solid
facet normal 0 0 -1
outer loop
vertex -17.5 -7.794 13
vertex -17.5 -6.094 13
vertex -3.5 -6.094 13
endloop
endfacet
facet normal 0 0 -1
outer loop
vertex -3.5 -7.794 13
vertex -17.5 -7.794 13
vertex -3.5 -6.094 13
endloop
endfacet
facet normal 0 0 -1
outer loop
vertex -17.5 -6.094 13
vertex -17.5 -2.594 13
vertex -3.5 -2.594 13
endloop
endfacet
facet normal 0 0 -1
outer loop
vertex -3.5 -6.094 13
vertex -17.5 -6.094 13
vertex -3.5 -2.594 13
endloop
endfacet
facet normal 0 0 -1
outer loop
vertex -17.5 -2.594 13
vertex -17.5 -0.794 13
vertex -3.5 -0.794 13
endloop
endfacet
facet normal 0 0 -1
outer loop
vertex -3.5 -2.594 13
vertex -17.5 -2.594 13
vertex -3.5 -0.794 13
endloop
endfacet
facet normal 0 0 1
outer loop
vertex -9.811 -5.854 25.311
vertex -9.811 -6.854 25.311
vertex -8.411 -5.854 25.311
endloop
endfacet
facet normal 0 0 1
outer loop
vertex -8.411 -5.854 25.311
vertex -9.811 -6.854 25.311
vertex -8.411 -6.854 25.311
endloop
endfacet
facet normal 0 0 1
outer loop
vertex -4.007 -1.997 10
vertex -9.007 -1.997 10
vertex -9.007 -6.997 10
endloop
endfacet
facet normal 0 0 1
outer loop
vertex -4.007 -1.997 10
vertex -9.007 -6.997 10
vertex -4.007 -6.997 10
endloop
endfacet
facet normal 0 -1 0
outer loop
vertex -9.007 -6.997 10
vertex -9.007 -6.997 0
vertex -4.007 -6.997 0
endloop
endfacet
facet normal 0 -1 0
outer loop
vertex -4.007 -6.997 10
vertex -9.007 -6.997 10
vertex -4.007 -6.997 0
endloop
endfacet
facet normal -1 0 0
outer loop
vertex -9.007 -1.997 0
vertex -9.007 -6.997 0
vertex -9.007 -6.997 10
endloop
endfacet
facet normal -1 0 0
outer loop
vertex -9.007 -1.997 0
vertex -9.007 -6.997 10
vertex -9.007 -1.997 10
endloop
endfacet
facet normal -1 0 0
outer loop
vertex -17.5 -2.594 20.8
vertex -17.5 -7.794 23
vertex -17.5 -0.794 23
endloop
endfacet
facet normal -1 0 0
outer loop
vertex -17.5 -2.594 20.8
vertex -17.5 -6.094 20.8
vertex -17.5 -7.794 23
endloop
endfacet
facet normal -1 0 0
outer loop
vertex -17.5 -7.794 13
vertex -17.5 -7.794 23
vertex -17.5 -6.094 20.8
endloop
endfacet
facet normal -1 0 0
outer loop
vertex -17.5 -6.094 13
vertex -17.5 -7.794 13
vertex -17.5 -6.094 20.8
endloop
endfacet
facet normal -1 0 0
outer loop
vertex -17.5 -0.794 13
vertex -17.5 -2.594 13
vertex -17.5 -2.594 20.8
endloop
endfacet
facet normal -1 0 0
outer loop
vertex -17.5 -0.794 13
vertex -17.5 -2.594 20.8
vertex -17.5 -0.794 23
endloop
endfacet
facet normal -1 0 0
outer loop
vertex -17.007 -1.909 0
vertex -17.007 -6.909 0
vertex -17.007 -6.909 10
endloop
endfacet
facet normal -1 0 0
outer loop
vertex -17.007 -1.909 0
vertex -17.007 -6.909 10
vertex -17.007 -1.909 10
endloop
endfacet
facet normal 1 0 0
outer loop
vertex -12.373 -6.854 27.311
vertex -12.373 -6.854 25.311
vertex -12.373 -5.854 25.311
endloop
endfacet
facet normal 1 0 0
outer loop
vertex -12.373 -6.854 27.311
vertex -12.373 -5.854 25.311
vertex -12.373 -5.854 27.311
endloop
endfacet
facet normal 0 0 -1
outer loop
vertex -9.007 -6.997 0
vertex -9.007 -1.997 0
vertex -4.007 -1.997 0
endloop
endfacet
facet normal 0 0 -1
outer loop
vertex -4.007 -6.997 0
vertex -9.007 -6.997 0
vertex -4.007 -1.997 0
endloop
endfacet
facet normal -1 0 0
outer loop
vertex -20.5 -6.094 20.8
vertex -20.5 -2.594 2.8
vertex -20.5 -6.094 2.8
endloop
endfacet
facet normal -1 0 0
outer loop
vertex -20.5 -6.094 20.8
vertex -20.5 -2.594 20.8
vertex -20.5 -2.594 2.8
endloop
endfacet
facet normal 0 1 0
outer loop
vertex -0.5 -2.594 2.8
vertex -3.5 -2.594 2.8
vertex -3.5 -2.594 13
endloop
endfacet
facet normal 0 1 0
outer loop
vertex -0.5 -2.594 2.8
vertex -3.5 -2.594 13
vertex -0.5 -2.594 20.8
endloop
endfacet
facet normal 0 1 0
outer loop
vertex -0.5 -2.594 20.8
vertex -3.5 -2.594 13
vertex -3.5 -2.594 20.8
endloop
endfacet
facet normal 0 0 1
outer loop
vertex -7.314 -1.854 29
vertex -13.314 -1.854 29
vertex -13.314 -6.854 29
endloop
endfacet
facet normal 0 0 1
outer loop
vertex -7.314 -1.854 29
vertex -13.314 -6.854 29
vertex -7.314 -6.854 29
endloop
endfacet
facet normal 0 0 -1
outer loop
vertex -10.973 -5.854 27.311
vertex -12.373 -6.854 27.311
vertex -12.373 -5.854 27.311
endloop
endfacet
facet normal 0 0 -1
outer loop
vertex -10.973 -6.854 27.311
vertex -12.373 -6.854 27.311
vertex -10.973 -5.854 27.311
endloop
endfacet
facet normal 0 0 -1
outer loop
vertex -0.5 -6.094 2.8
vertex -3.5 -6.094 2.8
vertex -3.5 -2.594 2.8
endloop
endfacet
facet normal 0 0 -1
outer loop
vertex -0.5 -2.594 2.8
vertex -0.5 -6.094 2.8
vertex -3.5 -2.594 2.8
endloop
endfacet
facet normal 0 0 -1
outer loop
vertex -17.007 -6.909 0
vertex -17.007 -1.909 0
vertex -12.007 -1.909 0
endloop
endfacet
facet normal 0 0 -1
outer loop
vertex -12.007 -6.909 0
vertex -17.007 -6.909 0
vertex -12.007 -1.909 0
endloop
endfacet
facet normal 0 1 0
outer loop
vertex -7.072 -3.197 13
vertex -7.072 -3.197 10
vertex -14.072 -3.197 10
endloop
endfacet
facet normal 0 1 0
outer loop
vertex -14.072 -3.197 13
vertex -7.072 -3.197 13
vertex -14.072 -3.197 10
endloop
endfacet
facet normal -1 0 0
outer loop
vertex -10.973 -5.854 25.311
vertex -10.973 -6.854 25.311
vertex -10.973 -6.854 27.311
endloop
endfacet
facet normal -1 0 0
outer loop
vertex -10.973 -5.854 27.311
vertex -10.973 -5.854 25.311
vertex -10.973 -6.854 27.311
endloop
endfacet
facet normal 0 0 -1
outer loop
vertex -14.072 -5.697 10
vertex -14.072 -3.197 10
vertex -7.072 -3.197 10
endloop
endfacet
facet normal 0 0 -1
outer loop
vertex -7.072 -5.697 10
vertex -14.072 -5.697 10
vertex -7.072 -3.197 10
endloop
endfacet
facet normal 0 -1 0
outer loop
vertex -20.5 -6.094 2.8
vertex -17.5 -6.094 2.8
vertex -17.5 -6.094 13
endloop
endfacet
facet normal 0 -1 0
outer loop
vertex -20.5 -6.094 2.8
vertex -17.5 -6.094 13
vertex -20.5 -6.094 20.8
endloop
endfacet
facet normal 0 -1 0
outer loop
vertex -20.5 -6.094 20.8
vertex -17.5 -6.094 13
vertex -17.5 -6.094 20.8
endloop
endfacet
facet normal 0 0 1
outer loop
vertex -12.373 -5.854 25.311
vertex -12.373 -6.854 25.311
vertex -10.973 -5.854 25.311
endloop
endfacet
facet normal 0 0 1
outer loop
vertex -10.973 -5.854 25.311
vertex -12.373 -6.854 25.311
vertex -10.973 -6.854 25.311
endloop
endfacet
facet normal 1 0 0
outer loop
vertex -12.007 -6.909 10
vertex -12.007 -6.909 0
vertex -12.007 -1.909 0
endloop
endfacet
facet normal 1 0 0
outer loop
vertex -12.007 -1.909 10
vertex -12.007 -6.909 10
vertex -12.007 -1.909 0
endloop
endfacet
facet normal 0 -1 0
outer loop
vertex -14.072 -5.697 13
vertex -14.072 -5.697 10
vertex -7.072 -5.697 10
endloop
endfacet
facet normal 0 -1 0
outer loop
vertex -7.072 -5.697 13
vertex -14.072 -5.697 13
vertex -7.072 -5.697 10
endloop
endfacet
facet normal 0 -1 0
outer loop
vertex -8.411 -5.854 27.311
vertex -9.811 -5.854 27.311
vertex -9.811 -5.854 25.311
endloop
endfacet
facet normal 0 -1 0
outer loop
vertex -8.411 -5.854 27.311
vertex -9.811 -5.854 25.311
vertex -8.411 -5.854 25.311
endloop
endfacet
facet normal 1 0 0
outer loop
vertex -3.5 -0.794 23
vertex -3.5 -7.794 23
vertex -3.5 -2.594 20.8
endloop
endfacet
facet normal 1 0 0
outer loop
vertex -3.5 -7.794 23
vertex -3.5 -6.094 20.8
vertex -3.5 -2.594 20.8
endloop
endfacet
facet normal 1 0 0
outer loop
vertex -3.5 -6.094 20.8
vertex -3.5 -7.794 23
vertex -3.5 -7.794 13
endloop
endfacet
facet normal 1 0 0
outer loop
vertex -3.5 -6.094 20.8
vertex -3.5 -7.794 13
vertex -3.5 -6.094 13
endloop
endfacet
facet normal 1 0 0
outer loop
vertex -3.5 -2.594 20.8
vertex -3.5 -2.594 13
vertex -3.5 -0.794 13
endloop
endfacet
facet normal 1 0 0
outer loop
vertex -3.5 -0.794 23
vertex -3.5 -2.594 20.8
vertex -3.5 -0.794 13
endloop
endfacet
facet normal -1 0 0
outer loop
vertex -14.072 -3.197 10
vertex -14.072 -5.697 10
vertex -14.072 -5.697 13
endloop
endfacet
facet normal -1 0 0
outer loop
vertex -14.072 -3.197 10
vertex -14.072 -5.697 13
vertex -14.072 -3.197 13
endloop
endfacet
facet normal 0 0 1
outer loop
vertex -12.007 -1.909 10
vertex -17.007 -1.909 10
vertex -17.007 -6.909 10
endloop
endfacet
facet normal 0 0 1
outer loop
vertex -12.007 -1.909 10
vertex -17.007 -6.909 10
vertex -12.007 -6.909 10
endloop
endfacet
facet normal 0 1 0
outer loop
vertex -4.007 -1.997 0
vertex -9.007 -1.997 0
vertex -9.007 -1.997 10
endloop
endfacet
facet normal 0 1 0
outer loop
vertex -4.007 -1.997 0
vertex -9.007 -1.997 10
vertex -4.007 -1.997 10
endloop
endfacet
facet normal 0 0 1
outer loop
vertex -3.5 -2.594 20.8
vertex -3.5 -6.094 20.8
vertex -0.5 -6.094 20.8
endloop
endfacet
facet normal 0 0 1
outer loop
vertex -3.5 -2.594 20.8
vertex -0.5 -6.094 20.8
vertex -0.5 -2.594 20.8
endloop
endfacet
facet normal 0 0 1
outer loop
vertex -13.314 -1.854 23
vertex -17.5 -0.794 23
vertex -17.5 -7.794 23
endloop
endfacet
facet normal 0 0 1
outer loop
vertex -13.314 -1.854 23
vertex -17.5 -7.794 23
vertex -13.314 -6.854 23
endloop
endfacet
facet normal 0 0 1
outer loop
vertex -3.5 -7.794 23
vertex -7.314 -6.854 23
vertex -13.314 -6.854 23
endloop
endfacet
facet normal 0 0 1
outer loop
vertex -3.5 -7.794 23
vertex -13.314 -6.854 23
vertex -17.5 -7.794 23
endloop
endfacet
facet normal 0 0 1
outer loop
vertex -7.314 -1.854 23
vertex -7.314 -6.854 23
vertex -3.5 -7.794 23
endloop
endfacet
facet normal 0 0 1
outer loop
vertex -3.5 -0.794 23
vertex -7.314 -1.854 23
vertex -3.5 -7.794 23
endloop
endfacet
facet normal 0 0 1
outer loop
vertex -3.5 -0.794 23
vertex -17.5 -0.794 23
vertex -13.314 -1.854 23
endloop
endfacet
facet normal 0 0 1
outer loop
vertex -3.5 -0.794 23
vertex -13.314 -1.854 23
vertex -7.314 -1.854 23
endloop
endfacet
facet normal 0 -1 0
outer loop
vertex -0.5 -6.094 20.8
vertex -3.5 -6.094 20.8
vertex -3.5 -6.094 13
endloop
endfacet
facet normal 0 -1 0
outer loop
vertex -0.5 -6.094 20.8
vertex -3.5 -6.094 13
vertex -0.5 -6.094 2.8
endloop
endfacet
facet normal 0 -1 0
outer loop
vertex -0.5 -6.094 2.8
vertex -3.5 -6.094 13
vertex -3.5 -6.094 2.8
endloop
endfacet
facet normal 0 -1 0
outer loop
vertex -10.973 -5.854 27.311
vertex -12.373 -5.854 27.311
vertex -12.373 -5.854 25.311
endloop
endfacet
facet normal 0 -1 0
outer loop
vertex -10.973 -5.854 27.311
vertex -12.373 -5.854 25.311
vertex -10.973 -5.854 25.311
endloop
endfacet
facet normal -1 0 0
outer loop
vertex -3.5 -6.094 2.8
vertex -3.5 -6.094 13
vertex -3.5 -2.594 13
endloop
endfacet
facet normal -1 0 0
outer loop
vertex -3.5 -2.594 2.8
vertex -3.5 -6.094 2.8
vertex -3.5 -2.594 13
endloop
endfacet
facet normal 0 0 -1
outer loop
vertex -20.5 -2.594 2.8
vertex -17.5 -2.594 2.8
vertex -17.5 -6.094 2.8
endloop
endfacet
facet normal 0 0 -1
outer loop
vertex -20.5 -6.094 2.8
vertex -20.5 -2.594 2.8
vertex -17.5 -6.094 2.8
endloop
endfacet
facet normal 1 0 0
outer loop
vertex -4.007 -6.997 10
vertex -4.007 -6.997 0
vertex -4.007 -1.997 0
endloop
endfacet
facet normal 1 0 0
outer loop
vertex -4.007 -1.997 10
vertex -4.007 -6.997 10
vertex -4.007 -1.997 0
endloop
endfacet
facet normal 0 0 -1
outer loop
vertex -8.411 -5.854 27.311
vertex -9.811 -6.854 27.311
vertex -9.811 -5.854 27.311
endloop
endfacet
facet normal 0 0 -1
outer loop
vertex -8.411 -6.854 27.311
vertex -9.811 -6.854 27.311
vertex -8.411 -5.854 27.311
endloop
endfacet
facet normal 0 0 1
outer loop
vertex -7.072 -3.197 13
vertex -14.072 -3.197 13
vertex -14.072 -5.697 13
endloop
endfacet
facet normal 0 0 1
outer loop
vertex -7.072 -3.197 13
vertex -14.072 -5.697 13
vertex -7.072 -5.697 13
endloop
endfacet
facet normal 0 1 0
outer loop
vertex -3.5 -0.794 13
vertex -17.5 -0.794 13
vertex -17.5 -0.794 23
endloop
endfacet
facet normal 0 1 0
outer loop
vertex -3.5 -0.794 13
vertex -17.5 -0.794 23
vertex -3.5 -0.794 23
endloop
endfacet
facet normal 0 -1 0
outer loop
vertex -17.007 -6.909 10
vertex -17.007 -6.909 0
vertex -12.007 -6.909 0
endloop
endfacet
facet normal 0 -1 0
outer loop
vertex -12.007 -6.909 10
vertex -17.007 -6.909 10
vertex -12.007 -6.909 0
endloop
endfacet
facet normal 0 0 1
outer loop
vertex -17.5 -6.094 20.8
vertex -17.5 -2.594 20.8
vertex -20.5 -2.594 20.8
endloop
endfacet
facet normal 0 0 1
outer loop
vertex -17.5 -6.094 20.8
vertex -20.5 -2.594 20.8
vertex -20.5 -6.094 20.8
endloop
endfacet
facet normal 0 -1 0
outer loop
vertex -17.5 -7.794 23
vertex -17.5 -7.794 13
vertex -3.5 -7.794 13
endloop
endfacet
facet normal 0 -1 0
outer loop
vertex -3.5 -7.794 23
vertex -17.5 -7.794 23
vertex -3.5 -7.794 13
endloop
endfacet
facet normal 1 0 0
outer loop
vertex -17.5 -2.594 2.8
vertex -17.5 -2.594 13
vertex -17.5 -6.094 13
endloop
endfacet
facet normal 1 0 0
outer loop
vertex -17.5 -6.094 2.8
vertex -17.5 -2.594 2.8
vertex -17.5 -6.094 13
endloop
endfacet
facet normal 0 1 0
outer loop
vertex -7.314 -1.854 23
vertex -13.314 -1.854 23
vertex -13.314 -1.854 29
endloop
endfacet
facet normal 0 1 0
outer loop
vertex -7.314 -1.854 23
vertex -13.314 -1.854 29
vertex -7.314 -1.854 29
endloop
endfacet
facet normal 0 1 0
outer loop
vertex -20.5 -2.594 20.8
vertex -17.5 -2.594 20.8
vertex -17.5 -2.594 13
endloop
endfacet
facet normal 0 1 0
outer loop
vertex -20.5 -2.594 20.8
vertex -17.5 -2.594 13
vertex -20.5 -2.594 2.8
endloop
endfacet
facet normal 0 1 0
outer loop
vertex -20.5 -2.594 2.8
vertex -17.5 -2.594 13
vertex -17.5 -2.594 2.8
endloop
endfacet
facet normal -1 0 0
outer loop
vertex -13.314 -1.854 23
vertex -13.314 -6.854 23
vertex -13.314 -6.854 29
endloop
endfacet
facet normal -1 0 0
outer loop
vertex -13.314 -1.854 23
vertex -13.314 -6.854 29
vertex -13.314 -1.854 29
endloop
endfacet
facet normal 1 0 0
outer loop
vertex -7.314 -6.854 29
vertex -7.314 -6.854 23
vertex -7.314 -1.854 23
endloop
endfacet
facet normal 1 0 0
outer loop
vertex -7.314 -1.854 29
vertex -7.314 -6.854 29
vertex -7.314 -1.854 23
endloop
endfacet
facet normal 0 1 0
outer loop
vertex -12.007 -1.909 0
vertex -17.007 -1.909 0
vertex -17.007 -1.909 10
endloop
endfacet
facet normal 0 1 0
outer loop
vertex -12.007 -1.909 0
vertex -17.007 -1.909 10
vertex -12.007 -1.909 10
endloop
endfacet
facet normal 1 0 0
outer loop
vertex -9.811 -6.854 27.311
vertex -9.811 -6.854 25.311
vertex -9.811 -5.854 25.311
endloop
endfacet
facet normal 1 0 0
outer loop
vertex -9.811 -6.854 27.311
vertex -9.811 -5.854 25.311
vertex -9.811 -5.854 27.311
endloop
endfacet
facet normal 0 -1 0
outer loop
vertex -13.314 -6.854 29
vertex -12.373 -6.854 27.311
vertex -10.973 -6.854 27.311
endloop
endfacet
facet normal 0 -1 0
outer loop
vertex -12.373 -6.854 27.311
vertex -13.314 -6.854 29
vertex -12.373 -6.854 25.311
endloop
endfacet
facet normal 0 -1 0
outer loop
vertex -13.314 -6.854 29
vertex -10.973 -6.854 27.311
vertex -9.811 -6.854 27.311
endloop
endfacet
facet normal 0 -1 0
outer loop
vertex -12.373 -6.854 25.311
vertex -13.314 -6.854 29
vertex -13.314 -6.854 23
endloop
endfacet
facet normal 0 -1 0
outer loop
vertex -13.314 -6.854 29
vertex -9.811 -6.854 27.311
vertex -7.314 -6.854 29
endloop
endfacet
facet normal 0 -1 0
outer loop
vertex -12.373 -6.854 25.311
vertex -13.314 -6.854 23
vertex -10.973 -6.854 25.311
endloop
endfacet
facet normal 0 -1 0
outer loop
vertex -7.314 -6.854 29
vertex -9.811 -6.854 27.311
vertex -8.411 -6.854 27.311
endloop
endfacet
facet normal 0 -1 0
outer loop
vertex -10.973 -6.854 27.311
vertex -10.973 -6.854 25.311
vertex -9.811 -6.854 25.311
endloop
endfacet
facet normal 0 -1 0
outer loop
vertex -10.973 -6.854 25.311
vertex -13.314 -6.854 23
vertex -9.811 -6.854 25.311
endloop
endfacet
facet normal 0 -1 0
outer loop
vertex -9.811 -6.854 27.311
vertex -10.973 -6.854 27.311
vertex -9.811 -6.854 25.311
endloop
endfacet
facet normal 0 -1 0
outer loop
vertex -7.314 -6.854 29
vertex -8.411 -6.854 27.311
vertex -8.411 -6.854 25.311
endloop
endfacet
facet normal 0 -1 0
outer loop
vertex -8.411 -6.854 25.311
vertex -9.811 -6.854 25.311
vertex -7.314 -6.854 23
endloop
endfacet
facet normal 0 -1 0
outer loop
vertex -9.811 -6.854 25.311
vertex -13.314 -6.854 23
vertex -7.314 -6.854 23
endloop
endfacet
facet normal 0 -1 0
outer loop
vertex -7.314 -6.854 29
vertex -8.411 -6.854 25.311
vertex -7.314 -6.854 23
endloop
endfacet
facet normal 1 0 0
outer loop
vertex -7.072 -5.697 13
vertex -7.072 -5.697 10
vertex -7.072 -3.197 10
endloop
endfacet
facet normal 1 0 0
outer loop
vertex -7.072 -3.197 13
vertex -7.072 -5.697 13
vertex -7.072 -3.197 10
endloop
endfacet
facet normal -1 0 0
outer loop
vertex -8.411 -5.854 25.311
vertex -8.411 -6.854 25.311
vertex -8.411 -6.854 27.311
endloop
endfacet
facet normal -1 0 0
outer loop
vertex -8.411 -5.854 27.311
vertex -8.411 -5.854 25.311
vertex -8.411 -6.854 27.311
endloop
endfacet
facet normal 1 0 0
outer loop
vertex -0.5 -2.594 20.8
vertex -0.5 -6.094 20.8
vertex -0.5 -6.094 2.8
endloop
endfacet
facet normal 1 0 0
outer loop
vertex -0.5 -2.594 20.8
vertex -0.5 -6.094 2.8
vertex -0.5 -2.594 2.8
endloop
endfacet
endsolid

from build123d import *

# Parameters (mm, degrees)
F0_W      = 5
F0_H      = 5
F1_DEPTH  = 10
F2_W      = 2.065500658
F2_H      = 2.5
F2_W_2    = 4.934499342
F3_DEPTH  = 3
F4_W      = 14
F4_H      = 7
F4_W_2    = 7
F4_H_2    = 2.5
F5_DEPTH  = 10
F6_W      = 6
F6_H      = 5
F7_DEPTH  = 6
F8_W      = 1.4
F8_H      = 2
F9_DEPTH  = 1
F10_W     = 3.5
F10_H     = 7.8
F11_DEPTH = 3
F12_W     = 3.5
F12_H     = 10.2
F12_H_2   = 7.8
F13_DEPTH = 3


with BuildPart() as f1:
    # F0 (on Top) → F1 (new body)
    with BuildSketch(Plane.XY):
        with Locations((-14.5065793768, -4.4089912876)):
            Rectangle(F0_W, F0_H)
    extrude(amount=F1_DEPTH)


with BuildPart() as f1b:
    # F0 (on Top) → F1, piece 2 (new body)
    with BuildSketch(Plane.XY):
        with Locations((-6.5065793768, -4.4974009506)):
            Rectangle(F0_W, F0_H)
    extrude(amount=F1_DEPTH)


with BuildPart() as f3:
    # F2 (on face) → F3 (new body)
    with BuildSketch(Plane.XY.offset(10)):
        with Locations((-13.0393297058, -4.4468859397)):
            Rectangle(F2_W, F2_H)
        with Locations((-9.5393297058, -4.4468859397)):
            Rectangle(F2_W_2, F2_H)
    extrude(amount=F3_DEPTH)


with BuildPart() as f5:
    # F4 (on face) → F5 (new body)
    with BuildSketch(Plane.XY.offset(13)):
        with Locations((-10.500335617, -4.2941762283)):
            Rectangle(F4_W, F4_H)
        with Locations((-10.5720800348, -4.4468859397)):
            Rectangle(F4_W_2, F4_H_2, mode=Mode.SUBTRACT)
        with Locations((-10.5720800348, -4.4468859397)):
            Rectangle(F4_W_2, F4_H_2)
    extrude(amount=F5_DEPTH)

    # F6 (on face) → F7 (join)
    with BuildSketch(Plane.XY.offset(23)):
        with Locations((-10.3138480075, -4.354205858)):
            Rectangle(F6_W, F6_H)
    extrude(amount=F7_DEPTH)

    # F8 (on face) → F9 (cut)
    with BuildSketch(Plane.XZ.offset(6.854205858)):
        with Locations((-11.6725403297, 26.3112342762)):
            Rectangle(F8_W, F8_H)
        with Locations((-9.1112003411, 26.3112342762)):
            Rectangle(F8_W, F8_H)
    extrude(amount=-F9_DEPTH, mode=Mode.SUBTRACT)

    # F10 (on face) → F11 (join)
    with BuildSketch(Plane.YZ.offset(-3.500335617)):
        with Locations((-4.3441762283, 16.9)):
            Rectangle(F10_W, F10_H)
        Polygon((-2.5941762283, 13), (-6.0941762283, 13), (-6.0941762283, 2.8), (-2.5941762283, 2.8), (-2.5941762283, 3.5544625907), (-2.5941762283, 4.0402877186), align=None)
    extrude(amount=F11_DEPTH)

    # F12 (on face) → F13 (join)
    with BuildSketch(Plane(origin=(-17.500335617, 0, 0), x_dir=(0, -1, 0), z_dir=(-1, 0, 0))):
        with Locations((4.3441762283, 7.9)):
            Rectangle(F12_W, F12_H)
        with Locations((4.3441762283, 16.9)):
            Rectangle(F12_W, F12_H_2)
    extrude(amount=F13_DEPTH)


solid = Compound([f1.part, f1b.part, f3.part, f5.part])
